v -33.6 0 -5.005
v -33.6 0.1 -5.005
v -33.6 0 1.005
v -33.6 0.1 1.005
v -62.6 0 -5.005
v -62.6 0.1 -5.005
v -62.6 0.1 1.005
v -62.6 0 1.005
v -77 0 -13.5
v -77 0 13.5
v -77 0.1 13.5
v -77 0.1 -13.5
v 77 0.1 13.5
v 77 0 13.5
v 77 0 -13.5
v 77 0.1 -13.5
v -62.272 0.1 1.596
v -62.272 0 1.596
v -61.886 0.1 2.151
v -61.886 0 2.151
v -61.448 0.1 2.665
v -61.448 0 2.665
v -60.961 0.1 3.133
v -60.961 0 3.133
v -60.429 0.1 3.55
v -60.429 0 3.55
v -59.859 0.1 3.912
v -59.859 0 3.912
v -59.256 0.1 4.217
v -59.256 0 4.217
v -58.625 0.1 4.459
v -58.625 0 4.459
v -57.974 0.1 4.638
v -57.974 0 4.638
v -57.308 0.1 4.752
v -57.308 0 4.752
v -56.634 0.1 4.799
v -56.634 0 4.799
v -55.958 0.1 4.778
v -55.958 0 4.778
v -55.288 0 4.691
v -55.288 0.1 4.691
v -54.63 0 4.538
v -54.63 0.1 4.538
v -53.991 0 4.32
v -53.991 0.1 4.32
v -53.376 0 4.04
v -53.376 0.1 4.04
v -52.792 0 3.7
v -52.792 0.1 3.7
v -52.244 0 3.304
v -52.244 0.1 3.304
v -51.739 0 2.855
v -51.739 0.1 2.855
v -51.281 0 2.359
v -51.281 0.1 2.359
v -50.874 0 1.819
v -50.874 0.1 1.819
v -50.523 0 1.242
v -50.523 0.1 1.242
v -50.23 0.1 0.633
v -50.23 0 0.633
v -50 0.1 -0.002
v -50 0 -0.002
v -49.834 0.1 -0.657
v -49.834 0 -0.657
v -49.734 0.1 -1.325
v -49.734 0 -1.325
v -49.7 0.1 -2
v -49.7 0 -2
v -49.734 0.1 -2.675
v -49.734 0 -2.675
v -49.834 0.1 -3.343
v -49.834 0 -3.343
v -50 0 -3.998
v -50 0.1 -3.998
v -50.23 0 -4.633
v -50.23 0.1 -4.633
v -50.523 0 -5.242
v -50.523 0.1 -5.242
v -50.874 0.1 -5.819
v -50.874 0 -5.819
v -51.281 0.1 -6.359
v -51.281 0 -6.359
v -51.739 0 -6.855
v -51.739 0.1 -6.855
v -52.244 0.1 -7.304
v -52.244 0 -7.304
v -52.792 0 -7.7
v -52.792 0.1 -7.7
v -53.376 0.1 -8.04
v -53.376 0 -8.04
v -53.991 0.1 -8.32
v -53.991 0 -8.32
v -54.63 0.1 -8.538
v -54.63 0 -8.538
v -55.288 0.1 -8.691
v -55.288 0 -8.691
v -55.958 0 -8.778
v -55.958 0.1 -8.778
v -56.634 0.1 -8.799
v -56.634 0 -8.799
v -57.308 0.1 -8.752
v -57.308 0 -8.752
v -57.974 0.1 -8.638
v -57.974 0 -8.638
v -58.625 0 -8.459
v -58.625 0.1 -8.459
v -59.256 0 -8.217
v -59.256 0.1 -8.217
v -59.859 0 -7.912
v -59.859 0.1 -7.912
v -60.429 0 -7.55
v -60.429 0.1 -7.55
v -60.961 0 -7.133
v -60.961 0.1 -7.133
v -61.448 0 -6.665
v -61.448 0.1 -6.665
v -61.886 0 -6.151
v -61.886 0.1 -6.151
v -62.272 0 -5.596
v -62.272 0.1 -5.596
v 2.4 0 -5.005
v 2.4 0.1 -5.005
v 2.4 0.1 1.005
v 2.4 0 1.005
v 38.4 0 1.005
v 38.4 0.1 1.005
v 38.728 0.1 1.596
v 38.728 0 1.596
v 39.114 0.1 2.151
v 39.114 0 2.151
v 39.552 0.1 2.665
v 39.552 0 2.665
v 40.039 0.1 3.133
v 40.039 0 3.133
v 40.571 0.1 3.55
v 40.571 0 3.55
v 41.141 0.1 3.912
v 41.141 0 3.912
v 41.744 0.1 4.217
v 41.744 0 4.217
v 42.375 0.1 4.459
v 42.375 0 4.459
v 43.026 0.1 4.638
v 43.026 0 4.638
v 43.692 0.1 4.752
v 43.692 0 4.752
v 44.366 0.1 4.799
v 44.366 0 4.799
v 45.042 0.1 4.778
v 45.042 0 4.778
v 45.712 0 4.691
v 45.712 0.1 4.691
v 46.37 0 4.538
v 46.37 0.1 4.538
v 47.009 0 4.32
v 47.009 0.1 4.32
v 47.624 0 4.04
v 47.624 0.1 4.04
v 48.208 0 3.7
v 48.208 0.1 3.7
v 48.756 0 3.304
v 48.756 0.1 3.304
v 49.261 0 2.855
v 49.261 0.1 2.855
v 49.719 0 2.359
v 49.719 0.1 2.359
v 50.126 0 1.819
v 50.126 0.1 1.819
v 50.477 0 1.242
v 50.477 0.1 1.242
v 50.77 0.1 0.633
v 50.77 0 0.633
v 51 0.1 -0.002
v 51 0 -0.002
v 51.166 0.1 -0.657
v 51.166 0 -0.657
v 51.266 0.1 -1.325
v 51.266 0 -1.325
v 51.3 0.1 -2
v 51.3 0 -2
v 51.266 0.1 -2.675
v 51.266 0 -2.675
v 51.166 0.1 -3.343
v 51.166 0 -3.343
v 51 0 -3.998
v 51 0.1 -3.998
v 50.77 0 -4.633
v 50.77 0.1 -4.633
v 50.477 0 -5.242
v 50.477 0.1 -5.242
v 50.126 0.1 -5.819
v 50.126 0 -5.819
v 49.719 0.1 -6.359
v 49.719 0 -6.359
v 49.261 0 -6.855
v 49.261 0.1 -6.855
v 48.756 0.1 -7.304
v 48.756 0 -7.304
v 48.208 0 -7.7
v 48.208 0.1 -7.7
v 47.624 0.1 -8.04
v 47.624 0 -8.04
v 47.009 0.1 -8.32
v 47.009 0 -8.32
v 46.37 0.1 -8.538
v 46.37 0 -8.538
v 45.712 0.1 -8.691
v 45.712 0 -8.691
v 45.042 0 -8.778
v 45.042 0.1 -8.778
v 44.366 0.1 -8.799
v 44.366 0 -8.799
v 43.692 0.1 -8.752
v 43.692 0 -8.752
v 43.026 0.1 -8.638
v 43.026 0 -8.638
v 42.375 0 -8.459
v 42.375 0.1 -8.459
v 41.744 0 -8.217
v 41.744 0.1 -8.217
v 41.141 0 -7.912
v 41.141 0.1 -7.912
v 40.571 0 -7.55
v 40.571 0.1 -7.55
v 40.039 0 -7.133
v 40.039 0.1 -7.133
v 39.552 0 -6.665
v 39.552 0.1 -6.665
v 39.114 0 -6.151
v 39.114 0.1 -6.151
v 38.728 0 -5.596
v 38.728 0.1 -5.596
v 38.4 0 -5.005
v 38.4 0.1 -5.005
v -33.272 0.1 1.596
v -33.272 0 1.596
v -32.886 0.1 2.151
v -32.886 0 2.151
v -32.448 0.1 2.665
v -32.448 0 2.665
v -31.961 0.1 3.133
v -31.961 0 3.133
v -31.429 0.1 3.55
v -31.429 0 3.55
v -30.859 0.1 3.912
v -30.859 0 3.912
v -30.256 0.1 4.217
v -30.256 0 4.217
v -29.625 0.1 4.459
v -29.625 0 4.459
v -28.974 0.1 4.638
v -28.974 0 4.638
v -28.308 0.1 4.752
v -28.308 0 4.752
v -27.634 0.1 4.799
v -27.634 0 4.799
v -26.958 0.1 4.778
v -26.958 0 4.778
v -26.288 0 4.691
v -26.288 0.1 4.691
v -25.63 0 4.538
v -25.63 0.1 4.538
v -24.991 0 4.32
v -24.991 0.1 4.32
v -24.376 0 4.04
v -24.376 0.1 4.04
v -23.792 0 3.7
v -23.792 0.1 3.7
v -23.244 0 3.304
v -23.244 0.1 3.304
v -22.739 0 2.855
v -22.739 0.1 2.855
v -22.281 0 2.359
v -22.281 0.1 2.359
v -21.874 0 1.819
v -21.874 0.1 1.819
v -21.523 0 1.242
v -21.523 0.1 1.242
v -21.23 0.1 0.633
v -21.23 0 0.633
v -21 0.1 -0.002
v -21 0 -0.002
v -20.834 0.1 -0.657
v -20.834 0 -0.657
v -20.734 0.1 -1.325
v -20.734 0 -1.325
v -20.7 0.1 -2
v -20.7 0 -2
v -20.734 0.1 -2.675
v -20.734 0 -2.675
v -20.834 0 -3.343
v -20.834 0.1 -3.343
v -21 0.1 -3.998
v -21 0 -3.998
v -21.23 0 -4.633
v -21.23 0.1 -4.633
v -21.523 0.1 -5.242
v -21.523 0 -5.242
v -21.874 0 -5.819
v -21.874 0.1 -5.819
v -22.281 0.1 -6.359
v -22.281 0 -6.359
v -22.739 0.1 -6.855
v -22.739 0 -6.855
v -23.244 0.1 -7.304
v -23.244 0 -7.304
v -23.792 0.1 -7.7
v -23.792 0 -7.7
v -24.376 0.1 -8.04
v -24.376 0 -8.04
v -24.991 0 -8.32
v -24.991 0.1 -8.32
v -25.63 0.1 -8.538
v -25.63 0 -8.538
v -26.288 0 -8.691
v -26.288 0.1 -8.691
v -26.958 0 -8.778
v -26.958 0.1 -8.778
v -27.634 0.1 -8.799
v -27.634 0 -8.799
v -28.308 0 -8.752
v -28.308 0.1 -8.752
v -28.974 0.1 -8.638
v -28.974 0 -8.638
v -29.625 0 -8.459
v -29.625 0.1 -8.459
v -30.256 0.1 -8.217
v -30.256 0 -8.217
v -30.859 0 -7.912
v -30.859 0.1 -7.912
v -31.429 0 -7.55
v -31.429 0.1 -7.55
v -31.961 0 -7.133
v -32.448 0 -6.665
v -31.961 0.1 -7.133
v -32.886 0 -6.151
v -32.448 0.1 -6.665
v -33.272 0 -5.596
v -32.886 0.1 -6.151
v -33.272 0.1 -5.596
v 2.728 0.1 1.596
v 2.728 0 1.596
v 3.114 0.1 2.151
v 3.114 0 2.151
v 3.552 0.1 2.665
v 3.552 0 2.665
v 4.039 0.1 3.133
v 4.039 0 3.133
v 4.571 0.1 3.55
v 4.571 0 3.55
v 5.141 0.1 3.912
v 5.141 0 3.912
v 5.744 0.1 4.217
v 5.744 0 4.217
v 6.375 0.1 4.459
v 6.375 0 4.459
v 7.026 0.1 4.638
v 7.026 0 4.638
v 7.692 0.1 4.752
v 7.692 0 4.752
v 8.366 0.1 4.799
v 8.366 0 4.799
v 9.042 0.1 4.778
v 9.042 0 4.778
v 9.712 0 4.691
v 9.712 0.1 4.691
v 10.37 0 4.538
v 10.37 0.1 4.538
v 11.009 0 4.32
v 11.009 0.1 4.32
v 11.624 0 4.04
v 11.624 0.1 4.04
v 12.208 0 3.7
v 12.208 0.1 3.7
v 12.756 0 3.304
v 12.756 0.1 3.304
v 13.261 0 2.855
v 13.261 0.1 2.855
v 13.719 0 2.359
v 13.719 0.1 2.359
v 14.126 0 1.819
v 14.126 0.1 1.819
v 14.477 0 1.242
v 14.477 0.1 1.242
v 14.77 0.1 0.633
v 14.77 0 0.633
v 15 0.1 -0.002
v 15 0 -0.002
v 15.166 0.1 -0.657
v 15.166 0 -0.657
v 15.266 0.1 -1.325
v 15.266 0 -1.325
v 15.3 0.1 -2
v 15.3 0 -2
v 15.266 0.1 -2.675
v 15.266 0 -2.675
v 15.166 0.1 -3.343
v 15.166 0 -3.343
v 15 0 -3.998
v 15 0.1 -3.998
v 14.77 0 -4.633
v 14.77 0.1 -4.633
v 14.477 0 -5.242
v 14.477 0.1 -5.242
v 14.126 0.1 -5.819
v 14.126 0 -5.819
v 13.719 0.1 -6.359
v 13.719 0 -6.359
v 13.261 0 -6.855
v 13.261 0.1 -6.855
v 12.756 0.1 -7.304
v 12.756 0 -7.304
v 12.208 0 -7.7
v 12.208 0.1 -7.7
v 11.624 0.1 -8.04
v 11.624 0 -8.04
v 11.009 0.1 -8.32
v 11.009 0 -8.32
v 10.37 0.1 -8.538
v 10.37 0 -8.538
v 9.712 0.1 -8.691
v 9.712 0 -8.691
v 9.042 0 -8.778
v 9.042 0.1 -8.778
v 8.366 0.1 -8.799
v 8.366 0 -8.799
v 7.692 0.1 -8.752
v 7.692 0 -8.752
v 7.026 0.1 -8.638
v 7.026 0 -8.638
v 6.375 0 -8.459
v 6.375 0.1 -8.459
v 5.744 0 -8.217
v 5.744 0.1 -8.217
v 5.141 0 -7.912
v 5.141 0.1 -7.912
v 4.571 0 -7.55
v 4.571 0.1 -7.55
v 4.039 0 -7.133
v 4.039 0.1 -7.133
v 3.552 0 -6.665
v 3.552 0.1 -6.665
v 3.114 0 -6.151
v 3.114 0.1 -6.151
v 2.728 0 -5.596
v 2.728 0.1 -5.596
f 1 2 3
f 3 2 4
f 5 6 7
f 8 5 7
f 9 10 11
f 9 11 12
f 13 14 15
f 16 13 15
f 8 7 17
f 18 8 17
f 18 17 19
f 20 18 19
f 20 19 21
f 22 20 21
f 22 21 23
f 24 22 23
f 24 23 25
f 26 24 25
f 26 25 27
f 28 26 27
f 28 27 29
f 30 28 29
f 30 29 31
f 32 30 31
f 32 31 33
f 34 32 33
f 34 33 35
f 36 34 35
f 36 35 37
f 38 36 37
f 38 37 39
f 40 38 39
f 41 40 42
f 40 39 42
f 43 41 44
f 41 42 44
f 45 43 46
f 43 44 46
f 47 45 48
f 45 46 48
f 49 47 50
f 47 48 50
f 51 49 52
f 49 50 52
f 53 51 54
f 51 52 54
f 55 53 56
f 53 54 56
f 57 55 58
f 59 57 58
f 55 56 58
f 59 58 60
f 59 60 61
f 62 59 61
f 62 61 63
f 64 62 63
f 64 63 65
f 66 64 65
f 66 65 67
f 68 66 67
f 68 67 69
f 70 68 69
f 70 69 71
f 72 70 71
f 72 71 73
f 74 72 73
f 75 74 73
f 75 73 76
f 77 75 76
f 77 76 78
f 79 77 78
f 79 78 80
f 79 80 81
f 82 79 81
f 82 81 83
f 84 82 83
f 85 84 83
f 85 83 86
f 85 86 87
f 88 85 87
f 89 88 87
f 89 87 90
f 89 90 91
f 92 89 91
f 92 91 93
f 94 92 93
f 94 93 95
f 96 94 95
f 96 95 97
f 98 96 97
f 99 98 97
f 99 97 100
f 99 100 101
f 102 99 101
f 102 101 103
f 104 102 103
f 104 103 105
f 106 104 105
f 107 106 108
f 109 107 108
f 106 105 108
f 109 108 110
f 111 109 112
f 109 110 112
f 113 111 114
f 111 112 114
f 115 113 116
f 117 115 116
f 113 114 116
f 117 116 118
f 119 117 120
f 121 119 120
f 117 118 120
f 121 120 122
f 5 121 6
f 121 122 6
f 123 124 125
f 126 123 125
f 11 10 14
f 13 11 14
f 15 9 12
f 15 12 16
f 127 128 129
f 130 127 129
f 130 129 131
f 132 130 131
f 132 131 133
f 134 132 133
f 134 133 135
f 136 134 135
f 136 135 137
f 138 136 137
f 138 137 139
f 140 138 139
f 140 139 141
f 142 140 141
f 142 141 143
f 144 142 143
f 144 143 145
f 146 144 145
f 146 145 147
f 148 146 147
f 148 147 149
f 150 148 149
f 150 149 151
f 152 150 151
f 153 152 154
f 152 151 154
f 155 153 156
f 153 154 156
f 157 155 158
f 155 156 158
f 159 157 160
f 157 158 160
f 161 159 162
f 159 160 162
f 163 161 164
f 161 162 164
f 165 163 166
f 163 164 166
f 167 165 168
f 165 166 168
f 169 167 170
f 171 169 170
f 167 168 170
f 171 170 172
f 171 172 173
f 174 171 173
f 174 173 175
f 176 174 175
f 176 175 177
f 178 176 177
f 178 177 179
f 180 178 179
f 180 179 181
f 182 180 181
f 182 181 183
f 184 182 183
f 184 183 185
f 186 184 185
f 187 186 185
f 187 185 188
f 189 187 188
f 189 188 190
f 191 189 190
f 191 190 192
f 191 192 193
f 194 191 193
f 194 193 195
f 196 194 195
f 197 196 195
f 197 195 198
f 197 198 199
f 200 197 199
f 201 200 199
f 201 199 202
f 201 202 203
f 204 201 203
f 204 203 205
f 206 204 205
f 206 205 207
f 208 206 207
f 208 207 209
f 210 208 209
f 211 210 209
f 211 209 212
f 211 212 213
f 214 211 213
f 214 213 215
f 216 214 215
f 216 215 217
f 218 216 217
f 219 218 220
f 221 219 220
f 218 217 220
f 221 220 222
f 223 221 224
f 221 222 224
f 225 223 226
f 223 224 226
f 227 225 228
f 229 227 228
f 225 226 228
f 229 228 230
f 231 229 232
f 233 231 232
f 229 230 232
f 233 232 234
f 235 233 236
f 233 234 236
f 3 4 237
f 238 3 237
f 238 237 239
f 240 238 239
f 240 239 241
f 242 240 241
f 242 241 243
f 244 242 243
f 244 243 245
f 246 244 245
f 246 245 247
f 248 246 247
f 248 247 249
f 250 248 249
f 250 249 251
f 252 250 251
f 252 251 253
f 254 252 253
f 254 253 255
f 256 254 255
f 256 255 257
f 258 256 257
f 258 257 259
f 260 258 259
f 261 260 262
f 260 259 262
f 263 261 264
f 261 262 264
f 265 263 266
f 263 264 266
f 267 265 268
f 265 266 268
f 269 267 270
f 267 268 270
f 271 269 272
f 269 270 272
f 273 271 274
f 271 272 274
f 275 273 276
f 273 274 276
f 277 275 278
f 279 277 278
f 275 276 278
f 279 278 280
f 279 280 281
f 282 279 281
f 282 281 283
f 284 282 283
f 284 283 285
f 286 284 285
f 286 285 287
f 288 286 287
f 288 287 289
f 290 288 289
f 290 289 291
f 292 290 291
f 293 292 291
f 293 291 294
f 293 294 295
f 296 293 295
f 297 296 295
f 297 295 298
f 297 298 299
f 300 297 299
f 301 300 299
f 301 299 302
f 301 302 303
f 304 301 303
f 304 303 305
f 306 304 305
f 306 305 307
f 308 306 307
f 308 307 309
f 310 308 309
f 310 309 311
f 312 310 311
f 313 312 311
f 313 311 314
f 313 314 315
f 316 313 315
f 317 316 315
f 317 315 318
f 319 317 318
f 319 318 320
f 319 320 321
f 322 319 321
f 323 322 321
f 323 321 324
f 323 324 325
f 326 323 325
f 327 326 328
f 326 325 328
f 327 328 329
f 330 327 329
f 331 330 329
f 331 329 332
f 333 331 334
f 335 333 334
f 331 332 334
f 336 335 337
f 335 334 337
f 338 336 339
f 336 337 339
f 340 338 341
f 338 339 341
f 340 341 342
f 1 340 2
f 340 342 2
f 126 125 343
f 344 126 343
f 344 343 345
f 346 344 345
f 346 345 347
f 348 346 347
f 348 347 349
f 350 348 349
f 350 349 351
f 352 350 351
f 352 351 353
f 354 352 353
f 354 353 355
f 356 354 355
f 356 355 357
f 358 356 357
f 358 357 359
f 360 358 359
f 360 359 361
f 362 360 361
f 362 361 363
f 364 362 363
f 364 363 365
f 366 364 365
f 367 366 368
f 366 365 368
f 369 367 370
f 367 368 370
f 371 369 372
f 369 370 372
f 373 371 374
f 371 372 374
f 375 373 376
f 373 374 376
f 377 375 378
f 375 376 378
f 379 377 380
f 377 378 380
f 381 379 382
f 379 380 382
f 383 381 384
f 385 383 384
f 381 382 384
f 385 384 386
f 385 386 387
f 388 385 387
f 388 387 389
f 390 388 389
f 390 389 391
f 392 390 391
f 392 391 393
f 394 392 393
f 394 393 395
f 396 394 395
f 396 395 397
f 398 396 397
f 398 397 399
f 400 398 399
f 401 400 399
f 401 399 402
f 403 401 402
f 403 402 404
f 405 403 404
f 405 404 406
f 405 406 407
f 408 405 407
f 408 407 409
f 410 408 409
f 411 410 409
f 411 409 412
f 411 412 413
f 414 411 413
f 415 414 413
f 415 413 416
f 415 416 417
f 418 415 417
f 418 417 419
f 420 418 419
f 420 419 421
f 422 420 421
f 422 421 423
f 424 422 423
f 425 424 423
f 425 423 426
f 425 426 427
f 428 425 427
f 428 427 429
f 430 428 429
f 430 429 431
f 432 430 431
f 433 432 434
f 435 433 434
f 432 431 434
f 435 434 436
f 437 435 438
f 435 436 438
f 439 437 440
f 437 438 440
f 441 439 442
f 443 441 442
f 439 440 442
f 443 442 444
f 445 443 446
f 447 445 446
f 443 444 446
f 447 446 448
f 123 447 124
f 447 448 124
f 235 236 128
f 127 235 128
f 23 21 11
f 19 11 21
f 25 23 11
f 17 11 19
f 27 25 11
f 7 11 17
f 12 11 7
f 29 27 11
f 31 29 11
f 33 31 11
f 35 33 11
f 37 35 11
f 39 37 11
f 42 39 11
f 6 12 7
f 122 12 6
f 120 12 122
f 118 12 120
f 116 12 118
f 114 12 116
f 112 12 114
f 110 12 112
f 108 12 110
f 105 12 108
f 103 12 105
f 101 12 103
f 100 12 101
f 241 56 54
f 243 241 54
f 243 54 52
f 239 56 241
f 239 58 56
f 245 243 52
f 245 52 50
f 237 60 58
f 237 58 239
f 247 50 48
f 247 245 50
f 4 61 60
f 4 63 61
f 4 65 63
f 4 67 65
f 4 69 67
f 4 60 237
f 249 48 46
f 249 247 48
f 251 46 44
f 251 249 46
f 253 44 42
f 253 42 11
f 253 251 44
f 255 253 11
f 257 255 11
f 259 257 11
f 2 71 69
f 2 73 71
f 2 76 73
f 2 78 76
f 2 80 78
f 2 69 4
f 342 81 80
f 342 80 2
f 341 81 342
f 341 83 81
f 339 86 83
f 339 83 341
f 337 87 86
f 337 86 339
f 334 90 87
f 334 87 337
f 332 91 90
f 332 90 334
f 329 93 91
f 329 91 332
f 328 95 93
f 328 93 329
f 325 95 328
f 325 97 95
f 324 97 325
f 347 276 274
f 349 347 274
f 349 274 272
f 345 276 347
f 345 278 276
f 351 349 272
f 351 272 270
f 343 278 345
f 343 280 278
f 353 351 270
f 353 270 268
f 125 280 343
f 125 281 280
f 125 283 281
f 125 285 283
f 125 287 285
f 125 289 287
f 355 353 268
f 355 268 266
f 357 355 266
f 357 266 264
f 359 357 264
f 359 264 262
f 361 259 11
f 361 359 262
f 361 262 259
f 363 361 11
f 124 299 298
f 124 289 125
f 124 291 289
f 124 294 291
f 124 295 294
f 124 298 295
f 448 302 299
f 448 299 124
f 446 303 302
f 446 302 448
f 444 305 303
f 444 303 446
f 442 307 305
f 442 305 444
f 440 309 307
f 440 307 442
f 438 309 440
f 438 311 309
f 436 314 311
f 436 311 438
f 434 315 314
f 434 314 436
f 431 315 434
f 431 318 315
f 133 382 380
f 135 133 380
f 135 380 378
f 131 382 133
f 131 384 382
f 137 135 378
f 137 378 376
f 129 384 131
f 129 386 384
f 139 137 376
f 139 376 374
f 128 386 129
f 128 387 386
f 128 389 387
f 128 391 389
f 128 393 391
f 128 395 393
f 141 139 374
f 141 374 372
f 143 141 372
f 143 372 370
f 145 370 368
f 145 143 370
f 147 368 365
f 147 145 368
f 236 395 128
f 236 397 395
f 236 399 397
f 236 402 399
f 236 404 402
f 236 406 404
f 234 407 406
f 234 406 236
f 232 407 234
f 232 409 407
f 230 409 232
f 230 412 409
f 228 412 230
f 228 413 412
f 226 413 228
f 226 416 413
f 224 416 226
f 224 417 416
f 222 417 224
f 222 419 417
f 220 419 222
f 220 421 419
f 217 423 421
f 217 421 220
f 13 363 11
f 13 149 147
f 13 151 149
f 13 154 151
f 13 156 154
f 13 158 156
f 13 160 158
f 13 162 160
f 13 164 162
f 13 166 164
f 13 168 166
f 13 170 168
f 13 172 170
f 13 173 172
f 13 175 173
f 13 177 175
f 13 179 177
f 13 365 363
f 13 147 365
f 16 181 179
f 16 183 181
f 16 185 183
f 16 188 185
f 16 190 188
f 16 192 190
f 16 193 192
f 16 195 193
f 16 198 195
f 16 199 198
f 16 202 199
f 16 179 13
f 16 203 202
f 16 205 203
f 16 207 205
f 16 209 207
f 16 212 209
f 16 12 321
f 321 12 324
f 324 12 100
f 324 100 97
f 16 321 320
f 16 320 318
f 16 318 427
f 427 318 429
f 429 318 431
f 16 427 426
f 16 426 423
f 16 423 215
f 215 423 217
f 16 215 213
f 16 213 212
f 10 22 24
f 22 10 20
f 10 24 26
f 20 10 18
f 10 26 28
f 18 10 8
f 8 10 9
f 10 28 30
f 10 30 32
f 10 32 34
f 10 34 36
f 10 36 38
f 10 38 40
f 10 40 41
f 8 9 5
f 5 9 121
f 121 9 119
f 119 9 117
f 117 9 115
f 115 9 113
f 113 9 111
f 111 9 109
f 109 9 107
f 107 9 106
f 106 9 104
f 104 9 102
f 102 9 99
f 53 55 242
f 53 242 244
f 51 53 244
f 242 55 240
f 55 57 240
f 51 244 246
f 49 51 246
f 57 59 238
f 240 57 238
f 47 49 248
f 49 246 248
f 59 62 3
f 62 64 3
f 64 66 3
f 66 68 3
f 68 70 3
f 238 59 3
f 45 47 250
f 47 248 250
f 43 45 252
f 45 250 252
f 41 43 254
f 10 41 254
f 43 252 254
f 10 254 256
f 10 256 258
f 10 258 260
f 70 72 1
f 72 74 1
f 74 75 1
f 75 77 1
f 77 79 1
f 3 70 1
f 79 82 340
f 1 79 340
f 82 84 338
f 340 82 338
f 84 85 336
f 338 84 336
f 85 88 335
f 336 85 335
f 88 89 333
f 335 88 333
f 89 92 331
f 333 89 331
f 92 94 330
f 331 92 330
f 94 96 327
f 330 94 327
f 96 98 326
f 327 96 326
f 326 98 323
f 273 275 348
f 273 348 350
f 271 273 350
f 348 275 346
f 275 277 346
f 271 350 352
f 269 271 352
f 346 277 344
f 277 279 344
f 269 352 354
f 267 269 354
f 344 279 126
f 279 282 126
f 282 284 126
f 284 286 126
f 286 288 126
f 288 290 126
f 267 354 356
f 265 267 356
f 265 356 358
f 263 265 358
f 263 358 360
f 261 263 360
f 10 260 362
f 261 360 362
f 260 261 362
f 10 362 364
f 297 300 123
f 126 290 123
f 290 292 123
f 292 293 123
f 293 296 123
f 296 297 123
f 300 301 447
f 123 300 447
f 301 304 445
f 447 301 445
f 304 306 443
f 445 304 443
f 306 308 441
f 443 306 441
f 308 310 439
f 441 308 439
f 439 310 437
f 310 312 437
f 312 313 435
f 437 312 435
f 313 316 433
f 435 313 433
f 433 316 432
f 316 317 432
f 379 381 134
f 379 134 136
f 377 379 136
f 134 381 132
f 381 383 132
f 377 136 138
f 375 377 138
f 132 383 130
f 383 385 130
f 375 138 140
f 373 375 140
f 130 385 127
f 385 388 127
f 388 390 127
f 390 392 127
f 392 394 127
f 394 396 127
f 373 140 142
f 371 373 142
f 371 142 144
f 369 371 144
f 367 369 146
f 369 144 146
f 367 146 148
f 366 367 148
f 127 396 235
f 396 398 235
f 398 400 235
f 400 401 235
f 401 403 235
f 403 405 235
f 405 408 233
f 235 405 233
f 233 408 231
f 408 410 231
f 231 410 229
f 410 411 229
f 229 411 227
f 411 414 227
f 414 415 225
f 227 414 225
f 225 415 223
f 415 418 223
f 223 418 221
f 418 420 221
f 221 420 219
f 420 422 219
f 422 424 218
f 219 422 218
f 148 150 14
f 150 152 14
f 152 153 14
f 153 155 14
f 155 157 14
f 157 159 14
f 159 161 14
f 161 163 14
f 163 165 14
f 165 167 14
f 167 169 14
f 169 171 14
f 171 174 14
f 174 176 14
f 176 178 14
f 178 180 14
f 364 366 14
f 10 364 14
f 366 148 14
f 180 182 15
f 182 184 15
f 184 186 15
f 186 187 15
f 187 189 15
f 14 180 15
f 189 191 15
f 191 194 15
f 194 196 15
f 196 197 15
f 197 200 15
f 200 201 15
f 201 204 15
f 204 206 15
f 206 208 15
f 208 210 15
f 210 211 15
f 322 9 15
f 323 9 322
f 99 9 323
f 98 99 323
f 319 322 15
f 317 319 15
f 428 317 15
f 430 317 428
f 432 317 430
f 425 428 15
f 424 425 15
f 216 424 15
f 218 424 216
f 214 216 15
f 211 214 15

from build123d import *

# Parameters (mm, degrees)
SKETCH1_W           = 154
SKETCH1_H           = 27
BOSS_EXTRUDE1_DEPTH = 0.1
CUT_EXTRUDE1_DEPTH  = 79.174548288


with BuildPart() as part:
    # Sketch1 → Boss-Extrude1 (new body)
    with BuildSketch(Plane(origin=(0, 0, 0), x_dir=(1, 0, 0), z_dir=(0, 1, 0))):
        Rectangle(SKETCH1_W, SKETCH1_H)
    extrude(amount=BOSS_EXTRUDE1_DEPTH)

    # Sketch2 → Cut-Extrude1 (cut, through all)
    with BuildSketch(Plane(origin=(0, 0.1, 0), x_dir=(1, 0, 0), z_dir=(0, 1, 0))):
        with BuildLine():
            Line((2.4, 5.00499584), (2.4, -1.00499584))
            ThreePointArc((2.4, -1.00499584), (15.3, 2), (2.4, 5.00499584))
        make_face()
        with BuildLine():
            Line((38.4, 5.00499584), (38.4, -1.00499584))
            ThreePointArc((38.4, -1.00499584), (51.3, 2), (38.4, 5.00499584))
        make_face()
        with BuildLine():
            Line((-33.6, 5.00499584), (-33.6, -1.00499584))
            ThreePointArc((-33.6, -1.00499584), (-20.7, 2), (-33.6, 5.00499584))
        make_face()
        with BuildLine():
            Line((-62.6, 5.00499584), (-62.6, -1.00499584))
            ThreePointArc((-62.6, -1.00499584), (-49.7, 2), (-62.6, 5.00499584))
        make_face()
    extrude(amount=-CUT_EXTRUDE1_DEPTH, mode=Mode.SUBTRACT)


solid = part.part
